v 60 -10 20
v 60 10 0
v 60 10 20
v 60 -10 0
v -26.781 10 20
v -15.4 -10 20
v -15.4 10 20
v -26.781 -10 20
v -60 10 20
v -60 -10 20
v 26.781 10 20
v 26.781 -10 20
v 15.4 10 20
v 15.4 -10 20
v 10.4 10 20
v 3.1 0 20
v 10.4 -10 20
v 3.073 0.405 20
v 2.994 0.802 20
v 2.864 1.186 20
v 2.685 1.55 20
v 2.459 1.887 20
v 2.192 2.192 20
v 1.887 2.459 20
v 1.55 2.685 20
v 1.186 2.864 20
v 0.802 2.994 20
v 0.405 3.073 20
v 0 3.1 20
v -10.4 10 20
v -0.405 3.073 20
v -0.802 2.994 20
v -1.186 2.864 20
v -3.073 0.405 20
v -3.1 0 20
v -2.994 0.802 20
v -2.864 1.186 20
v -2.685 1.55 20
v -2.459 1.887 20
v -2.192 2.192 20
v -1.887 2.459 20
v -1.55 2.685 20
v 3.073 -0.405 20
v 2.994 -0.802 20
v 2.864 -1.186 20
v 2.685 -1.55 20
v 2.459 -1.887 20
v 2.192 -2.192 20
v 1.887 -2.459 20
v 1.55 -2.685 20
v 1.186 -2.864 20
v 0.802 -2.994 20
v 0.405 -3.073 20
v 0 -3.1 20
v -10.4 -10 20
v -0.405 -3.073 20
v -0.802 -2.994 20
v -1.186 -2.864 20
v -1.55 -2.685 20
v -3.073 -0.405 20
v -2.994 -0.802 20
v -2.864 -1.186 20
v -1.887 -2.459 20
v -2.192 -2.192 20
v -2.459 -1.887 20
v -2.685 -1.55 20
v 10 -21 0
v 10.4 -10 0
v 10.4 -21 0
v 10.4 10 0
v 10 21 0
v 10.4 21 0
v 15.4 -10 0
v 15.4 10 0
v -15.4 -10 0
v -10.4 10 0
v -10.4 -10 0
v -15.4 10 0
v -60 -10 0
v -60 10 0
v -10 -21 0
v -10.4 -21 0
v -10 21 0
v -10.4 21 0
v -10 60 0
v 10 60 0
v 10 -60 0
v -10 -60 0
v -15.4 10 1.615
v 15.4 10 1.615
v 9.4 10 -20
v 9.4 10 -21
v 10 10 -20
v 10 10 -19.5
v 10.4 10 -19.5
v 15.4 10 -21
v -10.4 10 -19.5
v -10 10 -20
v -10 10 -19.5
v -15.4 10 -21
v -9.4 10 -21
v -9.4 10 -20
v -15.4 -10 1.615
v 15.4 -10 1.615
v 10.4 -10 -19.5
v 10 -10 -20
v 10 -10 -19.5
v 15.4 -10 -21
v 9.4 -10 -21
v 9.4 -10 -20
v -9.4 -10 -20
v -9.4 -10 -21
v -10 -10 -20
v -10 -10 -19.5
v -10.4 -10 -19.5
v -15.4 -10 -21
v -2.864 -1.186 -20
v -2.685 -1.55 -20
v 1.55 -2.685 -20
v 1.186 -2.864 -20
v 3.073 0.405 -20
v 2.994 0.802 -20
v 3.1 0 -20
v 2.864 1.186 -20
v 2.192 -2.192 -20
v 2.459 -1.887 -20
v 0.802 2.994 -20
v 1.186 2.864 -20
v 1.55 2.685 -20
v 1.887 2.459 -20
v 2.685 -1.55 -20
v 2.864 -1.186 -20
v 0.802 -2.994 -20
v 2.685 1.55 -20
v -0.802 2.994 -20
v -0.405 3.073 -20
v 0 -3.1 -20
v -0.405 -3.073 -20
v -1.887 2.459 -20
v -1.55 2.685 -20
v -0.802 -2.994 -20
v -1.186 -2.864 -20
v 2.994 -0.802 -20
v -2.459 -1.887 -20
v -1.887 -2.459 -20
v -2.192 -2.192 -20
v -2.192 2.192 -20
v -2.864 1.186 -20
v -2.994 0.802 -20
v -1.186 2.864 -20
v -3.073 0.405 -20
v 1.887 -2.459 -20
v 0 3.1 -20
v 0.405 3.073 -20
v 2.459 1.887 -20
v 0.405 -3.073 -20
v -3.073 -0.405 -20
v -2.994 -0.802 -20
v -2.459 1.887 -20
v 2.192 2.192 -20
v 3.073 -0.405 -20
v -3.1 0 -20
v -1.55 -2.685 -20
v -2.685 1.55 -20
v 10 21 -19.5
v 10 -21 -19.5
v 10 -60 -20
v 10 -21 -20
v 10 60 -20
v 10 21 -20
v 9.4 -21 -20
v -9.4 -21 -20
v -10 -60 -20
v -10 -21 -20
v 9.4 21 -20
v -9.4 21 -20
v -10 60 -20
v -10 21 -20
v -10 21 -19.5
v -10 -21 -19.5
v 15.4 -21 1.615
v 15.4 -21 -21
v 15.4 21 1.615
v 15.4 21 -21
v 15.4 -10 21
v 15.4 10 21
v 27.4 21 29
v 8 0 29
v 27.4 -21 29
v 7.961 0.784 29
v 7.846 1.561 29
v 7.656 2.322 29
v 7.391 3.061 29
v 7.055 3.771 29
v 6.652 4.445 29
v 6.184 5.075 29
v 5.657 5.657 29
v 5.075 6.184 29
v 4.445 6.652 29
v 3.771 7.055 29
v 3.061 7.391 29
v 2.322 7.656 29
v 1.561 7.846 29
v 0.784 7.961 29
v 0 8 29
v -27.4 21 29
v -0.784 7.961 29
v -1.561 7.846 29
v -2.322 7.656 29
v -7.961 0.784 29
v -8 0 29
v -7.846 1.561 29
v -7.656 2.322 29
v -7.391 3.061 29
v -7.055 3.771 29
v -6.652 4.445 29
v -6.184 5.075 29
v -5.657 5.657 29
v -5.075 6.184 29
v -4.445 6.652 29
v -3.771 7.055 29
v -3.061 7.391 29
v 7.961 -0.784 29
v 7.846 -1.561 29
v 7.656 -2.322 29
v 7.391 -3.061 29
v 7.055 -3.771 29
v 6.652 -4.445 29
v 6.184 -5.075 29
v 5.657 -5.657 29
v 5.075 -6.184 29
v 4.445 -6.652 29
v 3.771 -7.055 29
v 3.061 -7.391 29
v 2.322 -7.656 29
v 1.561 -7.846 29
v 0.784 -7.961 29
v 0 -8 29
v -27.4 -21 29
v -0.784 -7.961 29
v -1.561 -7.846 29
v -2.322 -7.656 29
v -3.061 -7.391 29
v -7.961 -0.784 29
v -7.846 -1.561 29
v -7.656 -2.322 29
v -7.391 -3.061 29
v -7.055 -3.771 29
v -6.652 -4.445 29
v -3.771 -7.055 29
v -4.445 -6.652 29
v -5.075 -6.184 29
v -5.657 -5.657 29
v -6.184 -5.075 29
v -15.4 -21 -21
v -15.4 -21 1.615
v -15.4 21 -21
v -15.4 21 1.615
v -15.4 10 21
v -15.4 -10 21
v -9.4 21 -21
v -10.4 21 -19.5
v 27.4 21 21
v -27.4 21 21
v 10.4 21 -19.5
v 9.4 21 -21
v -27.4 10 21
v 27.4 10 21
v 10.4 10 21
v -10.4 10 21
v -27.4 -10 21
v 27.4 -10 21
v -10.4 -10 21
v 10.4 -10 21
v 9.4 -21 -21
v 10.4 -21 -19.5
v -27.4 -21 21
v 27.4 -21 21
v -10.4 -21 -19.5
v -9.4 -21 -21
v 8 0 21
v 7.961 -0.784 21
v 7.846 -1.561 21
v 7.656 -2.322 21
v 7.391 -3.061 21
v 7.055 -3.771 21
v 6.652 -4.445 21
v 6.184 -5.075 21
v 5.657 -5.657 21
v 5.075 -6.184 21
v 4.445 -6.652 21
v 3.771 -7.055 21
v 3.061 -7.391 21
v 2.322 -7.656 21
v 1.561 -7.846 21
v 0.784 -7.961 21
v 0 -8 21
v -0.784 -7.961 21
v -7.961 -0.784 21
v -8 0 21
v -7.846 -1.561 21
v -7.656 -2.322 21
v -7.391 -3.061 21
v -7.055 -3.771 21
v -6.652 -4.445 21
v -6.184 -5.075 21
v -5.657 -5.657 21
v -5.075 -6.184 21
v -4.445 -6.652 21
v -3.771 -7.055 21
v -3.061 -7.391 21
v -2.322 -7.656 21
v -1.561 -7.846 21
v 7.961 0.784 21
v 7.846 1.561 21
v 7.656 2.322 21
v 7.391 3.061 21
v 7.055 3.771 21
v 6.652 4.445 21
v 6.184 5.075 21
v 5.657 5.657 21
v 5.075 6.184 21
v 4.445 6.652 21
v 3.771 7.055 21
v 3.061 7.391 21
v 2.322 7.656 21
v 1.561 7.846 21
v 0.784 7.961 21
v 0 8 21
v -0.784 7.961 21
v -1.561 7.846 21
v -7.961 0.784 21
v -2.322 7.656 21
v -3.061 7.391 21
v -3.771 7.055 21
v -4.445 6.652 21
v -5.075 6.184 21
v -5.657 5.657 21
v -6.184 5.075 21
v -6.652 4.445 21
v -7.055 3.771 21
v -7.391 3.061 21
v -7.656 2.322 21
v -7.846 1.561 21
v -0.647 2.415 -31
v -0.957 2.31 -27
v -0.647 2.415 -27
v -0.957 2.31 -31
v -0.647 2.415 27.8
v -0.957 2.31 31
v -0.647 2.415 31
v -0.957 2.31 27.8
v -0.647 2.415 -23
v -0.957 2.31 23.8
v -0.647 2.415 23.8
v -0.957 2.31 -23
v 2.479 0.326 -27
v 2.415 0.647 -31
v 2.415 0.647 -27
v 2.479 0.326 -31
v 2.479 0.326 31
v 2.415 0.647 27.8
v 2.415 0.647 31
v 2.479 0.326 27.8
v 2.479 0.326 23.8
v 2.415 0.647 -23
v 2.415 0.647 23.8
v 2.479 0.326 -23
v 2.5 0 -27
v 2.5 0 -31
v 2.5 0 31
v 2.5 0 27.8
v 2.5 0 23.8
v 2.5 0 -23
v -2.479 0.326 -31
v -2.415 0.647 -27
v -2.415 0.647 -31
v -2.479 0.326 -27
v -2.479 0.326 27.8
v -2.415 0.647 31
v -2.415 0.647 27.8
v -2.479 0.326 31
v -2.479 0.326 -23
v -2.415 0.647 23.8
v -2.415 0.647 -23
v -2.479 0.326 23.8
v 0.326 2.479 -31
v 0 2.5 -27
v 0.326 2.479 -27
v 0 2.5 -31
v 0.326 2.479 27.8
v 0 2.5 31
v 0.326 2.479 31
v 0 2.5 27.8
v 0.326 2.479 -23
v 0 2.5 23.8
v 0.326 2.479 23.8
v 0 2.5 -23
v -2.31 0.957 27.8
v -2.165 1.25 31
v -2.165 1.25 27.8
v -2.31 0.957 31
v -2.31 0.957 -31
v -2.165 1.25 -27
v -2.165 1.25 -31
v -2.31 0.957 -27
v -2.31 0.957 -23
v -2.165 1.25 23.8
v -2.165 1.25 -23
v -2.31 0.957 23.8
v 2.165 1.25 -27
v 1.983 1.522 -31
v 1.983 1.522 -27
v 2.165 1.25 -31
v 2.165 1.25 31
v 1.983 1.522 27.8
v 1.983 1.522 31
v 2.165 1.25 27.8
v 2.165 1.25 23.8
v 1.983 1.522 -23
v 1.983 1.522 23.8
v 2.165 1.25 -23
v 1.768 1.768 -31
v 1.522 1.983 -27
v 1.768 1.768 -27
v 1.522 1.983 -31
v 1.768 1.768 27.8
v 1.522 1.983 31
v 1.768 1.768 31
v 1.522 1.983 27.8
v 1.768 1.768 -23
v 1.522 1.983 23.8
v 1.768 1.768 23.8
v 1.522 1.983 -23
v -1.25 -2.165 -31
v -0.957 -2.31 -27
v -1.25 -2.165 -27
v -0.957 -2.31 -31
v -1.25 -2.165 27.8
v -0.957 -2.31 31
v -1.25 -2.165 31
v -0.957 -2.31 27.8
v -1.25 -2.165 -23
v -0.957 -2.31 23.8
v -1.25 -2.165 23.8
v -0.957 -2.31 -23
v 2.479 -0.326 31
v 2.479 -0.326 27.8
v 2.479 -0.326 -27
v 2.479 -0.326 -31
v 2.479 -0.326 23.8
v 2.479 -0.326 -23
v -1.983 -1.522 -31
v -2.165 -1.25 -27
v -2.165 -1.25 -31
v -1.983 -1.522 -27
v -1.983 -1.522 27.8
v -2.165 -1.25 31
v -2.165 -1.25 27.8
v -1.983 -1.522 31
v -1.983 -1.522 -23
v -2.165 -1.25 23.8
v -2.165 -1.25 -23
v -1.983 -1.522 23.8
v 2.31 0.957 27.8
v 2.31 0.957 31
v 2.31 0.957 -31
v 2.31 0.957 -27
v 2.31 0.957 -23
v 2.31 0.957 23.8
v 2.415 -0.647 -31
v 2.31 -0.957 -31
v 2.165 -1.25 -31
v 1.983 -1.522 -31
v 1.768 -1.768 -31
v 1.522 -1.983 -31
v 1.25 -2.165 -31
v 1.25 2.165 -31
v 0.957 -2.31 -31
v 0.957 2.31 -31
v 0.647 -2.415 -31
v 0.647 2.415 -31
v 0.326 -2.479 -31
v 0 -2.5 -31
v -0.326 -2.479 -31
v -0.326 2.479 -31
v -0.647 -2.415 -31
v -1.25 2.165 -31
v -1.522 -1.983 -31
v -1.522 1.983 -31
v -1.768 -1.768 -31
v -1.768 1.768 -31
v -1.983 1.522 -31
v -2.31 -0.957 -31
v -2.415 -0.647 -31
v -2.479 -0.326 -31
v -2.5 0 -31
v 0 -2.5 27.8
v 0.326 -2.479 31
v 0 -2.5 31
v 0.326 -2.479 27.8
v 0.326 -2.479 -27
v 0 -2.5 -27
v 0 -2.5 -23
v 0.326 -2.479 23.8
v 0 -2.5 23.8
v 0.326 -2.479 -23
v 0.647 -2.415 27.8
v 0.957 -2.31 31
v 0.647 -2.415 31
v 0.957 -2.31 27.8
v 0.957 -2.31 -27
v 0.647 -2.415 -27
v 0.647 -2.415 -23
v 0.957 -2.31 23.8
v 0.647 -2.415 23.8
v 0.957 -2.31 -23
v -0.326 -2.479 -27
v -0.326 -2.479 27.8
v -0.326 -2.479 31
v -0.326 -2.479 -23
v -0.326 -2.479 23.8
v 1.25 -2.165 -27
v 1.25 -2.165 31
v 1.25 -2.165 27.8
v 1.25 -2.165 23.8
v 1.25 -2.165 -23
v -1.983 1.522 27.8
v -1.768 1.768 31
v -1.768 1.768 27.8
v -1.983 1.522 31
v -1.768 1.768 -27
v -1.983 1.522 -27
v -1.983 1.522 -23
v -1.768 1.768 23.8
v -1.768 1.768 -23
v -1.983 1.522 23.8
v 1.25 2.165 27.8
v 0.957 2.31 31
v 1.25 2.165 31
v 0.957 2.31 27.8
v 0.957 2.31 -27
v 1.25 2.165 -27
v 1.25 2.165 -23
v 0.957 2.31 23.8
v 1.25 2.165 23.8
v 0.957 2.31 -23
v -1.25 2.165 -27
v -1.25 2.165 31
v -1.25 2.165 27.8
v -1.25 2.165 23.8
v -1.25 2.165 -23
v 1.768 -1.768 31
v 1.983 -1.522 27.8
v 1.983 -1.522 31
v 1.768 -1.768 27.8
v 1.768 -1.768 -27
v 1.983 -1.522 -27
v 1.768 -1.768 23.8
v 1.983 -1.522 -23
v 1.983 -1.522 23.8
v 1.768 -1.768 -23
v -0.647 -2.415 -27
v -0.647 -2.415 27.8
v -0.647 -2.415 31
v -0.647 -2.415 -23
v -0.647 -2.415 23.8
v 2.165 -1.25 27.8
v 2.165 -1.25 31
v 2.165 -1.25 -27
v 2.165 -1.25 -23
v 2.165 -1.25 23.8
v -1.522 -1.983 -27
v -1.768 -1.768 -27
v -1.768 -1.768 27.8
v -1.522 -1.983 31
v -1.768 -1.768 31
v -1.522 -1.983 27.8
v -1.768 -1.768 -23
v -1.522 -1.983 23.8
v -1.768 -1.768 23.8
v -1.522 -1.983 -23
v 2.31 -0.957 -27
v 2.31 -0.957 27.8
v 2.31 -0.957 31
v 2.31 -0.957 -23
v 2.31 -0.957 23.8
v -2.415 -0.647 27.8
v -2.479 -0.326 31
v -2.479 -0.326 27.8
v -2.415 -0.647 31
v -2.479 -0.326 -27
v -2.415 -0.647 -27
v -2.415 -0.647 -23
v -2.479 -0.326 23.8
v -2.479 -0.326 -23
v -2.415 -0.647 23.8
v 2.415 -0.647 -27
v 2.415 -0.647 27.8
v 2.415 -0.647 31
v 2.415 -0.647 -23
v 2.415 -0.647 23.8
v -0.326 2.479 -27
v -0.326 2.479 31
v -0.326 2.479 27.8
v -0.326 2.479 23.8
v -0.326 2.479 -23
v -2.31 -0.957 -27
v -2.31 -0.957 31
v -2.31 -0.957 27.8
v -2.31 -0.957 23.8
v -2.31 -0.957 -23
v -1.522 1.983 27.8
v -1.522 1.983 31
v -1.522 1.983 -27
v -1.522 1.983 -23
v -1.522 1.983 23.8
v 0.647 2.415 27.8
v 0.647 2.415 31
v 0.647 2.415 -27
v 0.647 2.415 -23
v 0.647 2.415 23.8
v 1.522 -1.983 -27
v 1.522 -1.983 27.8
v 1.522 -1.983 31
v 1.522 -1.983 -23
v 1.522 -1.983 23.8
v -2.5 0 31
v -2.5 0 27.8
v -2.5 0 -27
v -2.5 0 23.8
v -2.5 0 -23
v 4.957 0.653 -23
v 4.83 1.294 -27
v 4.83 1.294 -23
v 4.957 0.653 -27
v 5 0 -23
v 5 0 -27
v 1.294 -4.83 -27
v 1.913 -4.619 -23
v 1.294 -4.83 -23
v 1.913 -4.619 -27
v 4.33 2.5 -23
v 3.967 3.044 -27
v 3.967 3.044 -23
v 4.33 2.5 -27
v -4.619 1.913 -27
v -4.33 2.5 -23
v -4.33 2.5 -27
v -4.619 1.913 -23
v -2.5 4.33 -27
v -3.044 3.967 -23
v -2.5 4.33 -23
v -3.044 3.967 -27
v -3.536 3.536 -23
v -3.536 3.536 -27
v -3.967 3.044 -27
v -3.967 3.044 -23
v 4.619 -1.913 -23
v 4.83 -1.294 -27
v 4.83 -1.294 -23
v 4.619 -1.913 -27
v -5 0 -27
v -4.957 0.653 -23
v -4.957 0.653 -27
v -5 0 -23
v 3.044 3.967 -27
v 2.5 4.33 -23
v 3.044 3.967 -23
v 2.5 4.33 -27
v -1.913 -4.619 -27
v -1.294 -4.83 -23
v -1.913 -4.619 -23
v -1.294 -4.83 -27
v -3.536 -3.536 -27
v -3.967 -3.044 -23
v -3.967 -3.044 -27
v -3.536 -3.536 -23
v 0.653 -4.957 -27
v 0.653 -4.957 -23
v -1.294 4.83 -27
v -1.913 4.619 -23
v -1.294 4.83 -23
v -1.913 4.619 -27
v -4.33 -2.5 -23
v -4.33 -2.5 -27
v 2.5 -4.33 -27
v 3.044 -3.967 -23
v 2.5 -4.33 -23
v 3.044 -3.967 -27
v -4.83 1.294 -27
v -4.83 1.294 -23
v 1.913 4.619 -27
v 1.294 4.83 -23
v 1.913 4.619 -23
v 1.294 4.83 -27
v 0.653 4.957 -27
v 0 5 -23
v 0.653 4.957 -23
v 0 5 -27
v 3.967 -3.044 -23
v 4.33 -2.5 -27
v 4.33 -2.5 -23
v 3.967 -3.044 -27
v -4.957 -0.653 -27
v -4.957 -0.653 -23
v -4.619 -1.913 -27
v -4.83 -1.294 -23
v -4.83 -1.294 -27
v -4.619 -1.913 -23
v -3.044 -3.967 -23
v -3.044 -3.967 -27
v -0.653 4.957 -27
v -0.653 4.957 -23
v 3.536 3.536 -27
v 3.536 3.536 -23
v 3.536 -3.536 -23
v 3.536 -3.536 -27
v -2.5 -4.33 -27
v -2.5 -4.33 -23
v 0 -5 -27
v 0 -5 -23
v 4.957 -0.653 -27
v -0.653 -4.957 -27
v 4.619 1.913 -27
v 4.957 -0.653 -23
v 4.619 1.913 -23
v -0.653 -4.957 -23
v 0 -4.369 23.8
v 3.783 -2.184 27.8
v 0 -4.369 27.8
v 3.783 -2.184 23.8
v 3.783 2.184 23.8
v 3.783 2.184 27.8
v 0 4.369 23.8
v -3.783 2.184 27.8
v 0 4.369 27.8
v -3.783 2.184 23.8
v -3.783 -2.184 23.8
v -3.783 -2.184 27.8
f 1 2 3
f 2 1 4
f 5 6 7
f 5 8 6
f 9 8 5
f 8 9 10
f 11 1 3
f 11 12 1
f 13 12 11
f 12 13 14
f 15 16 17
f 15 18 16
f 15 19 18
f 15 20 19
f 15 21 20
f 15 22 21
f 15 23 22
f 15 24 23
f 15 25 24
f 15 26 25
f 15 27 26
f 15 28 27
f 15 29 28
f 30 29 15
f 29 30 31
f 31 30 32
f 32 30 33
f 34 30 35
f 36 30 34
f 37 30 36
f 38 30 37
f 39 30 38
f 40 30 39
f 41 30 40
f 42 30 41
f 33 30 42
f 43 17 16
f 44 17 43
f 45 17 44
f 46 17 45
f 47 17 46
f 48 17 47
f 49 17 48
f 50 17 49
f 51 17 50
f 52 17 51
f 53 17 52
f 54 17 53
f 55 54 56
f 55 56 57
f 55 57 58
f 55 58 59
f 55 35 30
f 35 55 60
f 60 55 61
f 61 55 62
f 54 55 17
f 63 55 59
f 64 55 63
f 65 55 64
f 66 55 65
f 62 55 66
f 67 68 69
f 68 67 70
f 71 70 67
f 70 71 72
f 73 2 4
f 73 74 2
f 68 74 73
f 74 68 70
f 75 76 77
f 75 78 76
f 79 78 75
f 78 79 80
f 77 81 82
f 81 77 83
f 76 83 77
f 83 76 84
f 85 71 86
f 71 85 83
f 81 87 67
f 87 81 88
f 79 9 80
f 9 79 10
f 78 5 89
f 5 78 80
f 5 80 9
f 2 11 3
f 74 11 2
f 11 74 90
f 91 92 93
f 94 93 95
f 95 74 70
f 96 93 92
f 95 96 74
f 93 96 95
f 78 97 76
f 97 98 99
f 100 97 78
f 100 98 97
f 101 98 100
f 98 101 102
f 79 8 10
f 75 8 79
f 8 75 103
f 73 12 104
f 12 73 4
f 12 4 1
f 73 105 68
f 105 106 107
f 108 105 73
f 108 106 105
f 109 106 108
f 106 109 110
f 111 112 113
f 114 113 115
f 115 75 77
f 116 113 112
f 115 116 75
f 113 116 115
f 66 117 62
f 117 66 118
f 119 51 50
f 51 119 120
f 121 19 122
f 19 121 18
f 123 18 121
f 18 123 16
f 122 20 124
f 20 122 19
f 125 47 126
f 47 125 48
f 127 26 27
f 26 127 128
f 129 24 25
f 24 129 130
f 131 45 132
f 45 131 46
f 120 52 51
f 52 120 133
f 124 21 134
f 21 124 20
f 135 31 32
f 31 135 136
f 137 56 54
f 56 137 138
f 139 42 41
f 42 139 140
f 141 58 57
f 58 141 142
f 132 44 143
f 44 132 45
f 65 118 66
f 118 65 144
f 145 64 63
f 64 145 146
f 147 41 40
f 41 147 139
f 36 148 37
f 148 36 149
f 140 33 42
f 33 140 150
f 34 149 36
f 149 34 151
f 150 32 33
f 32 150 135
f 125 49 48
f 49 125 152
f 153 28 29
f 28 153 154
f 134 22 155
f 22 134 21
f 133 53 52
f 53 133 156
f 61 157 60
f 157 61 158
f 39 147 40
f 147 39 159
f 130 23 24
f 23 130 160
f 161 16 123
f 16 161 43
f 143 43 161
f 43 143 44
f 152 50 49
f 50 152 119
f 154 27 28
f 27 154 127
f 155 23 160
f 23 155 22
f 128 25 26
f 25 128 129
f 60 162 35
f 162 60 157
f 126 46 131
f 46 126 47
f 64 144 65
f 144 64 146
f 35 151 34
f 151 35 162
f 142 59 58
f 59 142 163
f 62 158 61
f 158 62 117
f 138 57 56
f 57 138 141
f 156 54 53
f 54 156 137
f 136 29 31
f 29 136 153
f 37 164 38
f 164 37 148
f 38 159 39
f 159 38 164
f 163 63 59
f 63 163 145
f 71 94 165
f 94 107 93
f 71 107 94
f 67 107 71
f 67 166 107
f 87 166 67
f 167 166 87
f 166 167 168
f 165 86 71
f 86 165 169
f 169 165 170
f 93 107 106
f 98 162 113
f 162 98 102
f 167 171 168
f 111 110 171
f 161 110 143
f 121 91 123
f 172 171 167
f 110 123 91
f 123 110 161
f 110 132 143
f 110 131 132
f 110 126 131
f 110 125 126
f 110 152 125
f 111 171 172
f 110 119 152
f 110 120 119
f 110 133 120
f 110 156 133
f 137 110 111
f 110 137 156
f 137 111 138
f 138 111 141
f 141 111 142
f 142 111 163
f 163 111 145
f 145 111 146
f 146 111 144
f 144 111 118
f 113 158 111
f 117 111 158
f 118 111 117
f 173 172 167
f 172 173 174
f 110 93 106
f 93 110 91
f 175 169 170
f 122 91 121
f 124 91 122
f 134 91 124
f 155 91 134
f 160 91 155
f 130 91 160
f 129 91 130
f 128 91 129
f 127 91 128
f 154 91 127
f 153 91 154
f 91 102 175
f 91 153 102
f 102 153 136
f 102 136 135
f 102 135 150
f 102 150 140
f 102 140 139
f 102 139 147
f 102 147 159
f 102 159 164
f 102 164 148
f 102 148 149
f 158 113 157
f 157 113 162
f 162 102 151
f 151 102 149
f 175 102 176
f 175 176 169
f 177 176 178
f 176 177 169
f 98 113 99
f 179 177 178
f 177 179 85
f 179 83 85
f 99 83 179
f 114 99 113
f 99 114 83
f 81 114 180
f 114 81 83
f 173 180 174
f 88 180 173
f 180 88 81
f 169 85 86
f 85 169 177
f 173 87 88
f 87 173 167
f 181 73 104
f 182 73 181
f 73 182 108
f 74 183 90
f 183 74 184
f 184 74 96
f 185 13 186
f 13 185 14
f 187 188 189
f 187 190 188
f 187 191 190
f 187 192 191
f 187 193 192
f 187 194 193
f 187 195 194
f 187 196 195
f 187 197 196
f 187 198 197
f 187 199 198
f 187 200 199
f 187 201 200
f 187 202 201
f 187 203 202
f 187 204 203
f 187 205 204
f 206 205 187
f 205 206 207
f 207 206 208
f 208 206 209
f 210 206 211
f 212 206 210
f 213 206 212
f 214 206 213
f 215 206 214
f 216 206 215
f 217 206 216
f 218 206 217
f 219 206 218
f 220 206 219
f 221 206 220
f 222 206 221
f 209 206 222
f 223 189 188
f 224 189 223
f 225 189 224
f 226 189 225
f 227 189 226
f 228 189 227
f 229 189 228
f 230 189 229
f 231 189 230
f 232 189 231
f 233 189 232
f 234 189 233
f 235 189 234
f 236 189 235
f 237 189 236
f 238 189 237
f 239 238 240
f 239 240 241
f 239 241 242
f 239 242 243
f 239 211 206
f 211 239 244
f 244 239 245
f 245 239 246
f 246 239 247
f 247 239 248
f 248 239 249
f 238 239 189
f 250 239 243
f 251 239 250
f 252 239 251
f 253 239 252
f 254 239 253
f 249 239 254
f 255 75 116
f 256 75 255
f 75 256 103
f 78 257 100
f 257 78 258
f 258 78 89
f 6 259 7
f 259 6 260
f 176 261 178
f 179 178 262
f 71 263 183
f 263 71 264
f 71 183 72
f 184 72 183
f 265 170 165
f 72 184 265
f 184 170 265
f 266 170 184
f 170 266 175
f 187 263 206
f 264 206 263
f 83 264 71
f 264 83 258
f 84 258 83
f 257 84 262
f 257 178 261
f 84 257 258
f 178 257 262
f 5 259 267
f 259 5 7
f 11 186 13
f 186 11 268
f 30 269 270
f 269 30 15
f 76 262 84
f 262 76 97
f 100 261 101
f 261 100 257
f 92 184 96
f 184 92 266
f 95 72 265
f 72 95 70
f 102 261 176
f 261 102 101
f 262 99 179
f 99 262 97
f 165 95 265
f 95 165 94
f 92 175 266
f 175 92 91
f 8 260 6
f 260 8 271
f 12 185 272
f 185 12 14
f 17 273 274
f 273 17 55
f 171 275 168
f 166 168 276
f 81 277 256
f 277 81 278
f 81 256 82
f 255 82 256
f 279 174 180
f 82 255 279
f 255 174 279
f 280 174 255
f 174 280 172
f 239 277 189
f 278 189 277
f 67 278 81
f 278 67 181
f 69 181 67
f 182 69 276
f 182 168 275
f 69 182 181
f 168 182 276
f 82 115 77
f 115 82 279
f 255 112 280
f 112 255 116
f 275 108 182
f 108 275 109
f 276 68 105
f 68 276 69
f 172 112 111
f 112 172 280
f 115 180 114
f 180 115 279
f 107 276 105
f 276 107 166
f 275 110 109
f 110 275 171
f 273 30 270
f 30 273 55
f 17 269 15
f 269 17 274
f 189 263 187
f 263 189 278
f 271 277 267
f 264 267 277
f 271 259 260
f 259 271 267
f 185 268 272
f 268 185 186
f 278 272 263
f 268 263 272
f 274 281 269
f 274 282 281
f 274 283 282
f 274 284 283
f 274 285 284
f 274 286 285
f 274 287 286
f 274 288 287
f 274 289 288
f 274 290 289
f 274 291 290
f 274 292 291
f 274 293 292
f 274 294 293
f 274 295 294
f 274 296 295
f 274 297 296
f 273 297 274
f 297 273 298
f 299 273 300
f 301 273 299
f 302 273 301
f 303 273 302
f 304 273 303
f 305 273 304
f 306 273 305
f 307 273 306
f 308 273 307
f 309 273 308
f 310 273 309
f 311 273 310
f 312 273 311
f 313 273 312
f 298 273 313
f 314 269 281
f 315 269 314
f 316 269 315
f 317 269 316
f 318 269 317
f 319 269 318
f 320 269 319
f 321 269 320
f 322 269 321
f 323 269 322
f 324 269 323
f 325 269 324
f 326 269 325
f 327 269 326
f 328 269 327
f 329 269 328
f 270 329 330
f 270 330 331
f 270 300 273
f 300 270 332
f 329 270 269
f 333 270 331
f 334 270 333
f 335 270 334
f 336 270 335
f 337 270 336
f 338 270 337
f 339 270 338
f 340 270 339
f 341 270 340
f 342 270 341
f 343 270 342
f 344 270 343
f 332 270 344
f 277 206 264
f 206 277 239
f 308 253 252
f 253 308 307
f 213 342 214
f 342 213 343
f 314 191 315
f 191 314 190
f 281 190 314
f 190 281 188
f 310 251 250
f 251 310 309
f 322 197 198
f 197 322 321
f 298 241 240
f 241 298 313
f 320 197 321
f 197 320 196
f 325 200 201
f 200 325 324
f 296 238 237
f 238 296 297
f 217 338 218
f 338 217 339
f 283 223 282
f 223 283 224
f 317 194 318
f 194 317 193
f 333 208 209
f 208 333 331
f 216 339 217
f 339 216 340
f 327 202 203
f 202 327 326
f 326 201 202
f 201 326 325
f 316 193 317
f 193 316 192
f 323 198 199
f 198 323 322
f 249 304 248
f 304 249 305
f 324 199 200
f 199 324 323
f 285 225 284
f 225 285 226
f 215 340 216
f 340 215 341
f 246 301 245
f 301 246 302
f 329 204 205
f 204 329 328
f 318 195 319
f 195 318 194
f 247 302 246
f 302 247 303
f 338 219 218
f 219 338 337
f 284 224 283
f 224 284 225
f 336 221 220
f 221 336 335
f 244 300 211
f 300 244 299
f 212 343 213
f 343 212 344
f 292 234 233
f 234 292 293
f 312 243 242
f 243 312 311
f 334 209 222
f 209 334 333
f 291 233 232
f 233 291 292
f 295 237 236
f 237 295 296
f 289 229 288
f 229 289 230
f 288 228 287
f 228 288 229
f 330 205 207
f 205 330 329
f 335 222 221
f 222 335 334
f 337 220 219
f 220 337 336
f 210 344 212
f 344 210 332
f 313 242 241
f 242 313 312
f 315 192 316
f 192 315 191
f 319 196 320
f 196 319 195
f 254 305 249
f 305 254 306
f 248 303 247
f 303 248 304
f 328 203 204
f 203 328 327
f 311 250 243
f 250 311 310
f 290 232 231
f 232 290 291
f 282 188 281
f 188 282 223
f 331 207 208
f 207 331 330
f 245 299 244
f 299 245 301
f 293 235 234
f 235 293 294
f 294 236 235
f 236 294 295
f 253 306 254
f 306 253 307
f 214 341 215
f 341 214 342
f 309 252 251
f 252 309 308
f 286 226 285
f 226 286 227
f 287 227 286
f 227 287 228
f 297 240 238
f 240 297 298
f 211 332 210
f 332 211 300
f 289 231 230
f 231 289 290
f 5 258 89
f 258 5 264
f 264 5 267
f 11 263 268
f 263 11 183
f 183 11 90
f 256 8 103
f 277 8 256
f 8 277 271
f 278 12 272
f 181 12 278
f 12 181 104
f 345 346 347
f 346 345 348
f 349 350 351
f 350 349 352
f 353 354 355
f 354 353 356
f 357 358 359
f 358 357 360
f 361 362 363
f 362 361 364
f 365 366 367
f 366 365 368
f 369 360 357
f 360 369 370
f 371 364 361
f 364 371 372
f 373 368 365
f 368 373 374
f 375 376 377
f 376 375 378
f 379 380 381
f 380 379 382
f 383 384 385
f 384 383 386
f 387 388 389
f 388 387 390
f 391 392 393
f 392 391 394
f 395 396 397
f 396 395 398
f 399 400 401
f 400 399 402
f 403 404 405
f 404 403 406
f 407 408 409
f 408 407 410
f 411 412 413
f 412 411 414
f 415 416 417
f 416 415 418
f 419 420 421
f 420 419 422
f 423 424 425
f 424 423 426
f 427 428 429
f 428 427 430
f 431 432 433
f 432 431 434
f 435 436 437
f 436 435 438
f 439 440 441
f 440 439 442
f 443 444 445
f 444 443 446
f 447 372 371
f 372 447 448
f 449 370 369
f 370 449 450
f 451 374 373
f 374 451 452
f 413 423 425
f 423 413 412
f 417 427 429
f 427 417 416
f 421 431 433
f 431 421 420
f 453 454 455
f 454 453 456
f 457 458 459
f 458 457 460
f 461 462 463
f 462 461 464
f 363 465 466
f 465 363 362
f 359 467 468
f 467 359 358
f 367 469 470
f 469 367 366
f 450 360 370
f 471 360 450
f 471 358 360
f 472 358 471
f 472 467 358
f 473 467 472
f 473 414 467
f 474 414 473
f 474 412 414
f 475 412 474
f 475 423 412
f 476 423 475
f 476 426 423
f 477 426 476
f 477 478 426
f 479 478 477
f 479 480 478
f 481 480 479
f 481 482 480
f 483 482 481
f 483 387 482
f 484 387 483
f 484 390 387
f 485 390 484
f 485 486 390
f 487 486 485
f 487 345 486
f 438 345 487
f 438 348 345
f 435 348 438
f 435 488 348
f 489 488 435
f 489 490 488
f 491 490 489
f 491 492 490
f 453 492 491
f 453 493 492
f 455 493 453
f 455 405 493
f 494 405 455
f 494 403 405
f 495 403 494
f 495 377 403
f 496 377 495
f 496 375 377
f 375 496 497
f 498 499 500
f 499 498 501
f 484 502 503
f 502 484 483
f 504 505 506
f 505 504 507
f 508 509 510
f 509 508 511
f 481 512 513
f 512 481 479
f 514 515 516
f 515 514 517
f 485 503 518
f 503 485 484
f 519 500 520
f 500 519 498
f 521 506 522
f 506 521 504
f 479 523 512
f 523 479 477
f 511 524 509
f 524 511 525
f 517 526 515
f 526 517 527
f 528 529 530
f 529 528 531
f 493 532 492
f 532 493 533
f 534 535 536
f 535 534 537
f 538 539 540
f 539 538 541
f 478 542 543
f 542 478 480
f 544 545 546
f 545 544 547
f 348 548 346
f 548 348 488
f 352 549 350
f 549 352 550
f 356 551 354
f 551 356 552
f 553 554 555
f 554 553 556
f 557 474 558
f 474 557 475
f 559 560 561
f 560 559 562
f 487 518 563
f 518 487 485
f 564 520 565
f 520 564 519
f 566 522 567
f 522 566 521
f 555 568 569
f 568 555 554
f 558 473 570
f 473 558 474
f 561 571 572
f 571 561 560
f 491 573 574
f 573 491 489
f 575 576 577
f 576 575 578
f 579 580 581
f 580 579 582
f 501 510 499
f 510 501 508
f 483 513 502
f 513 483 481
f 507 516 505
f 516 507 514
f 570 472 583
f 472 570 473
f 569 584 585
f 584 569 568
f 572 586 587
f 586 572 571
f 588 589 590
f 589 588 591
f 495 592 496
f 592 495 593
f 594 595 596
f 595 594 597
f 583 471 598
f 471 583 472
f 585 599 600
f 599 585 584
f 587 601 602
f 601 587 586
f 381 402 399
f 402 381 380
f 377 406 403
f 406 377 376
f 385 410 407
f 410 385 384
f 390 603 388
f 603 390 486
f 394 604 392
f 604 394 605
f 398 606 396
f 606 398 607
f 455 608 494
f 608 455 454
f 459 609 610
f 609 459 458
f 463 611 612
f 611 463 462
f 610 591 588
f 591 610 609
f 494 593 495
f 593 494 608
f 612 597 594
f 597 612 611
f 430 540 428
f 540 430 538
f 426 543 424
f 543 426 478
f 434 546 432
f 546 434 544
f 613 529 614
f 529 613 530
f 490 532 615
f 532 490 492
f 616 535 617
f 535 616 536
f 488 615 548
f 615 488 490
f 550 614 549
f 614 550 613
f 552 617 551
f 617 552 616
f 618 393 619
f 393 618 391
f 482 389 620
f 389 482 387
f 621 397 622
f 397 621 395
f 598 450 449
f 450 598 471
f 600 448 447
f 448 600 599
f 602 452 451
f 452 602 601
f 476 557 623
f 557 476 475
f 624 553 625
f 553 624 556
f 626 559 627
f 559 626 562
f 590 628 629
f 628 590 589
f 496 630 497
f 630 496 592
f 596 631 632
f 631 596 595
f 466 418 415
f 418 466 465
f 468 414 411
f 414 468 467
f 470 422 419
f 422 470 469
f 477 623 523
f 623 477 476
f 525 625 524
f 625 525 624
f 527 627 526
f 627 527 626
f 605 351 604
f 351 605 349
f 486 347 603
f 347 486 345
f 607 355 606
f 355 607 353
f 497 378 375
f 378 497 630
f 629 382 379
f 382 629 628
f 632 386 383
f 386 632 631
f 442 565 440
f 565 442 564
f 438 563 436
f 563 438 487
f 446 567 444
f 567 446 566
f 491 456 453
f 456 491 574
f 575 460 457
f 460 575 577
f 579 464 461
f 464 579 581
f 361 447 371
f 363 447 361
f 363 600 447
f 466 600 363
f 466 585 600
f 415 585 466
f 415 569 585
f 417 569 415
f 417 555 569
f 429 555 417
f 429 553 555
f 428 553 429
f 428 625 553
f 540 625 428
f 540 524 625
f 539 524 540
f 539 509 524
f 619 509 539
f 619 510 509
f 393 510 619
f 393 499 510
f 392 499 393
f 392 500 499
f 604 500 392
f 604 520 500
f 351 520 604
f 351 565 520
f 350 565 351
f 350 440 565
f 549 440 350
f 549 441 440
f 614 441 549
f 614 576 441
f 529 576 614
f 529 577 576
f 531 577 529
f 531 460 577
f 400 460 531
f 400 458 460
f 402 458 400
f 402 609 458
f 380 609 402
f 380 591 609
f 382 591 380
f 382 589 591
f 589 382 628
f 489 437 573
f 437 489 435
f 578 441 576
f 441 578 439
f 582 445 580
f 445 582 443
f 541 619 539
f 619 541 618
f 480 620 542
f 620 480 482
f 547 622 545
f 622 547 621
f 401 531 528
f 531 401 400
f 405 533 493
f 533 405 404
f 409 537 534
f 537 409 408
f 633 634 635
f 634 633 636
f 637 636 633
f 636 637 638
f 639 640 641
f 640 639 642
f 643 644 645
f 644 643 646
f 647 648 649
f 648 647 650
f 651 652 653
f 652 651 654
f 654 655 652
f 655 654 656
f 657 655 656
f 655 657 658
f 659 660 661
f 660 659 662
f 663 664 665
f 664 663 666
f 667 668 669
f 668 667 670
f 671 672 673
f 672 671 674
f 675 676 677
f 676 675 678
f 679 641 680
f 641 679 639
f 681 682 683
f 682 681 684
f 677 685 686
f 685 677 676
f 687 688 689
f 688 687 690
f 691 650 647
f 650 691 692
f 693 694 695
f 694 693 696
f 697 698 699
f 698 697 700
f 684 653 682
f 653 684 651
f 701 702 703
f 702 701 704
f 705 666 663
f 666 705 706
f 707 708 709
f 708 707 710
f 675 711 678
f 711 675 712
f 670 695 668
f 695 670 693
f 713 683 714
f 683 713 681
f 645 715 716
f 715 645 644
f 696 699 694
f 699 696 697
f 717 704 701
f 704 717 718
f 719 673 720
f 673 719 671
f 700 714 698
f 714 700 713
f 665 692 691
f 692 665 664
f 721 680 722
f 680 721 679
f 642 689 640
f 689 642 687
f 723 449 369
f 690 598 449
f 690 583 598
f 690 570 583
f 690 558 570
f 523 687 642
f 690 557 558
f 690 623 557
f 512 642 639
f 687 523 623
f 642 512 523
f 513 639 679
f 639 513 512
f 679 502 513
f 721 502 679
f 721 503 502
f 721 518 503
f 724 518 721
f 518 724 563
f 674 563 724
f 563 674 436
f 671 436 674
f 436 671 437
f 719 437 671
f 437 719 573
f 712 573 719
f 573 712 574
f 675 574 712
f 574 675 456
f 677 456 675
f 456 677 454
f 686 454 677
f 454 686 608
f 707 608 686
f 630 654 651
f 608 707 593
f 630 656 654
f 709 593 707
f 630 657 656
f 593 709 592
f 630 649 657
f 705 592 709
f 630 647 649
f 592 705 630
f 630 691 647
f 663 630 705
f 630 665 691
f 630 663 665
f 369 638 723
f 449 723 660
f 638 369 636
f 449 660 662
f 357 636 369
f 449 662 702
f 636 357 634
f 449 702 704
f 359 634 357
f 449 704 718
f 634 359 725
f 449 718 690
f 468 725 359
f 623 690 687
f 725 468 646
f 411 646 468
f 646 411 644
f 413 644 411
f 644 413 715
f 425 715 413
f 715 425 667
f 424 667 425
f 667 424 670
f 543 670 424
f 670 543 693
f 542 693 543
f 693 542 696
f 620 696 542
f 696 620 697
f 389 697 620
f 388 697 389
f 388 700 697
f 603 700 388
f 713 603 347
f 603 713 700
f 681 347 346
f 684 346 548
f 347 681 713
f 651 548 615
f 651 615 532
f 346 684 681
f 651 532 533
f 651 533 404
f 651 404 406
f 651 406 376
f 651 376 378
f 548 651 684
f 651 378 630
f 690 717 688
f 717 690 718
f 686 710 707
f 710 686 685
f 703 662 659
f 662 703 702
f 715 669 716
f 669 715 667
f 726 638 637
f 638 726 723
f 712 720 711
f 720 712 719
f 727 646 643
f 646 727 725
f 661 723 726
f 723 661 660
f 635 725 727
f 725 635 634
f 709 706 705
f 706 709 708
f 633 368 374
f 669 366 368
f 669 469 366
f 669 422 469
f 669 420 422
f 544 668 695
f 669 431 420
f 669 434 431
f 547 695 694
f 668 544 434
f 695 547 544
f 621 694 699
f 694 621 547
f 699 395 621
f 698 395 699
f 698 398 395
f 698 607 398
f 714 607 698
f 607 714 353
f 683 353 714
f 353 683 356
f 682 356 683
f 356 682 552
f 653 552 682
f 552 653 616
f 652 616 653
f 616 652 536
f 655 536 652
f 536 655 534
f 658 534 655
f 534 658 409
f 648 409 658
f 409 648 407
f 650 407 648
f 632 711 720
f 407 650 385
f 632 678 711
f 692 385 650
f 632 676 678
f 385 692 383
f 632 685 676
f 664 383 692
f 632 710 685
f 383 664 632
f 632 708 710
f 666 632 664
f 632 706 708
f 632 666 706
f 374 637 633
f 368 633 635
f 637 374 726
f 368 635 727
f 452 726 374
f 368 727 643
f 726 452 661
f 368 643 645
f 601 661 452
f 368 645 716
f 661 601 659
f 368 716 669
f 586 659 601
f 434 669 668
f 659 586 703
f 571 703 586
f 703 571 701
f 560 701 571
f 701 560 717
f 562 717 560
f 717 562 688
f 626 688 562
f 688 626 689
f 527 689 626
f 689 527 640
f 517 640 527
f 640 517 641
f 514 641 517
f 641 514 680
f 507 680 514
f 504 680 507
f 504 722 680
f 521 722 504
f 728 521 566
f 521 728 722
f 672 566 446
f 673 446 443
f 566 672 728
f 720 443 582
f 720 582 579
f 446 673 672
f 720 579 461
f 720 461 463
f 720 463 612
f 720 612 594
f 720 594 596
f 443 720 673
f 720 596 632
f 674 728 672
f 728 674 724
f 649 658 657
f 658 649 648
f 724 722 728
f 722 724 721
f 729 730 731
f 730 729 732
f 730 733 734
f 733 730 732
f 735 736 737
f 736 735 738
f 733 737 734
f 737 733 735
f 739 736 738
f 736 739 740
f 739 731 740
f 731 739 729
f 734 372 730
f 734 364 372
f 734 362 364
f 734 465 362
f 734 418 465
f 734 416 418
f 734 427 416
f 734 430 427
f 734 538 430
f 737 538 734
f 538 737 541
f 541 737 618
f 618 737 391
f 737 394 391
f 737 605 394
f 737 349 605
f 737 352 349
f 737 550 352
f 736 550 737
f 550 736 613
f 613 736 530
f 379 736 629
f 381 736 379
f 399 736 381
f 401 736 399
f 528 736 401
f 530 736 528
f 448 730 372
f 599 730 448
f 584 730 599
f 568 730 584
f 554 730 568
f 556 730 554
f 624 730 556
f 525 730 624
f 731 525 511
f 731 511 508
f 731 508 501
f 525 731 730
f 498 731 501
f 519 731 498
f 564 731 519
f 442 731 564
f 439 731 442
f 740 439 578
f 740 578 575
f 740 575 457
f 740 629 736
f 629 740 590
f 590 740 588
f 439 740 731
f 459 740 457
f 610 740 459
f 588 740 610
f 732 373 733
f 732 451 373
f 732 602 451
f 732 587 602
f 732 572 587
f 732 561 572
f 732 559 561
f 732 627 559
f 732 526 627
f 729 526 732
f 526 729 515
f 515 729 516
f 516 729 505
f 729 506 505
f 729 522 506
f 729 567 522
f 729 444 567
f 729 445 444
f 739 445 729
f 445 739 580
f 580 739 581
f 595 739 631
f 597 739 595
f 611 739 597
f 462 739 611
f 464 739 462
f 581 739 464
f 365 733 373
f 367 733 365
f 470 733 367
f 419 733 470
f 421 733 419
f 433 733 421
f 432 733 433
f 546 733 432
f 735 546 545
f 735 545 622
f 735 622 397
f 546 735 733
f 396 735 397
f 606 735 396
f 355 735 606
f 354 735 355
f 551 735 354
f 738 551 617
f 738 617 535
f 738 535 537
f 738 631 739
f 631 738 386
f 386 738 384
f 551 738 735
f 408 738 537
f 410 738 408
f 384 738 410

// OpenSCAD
// file: ../perpendicular-u-joint-guard-v1.3-triangular-corner-fills/candidate_triangular_corner_fills.scad
// Candidate v1.3: four triangular concave-corner fill blocks.
//
// Base: accepted v0.7 eaves12 geometry. v0.9/v1.0/v1.1/v1.2 are not
// imported. Each corner block is a real triangular prism: broad at the roof,
// tapering continuously toward z=0, and overlapping the U side wall.

use <../perpendicular-u-joint-guard-v0.7/perpendicular_double_u_guard.scad>;

$fn = 48;
PART = "candidate_iso";

// Explicit v0.7 interface values.
roof_x_outer = 27.4;       // accepted eaves12 roof: -27.4..+27.4
side_wall_x_outer = 15.4;  // existing side-wall outer edge
blue_tube_x_outer = 10.0;  // blue lower 20x20 tube half-width
plate_y_inner = 10.0;
plate_y_outer = 21.0;
plate_depth_y = plate_y_outer - plate_y_inner; // 11 mm per front/back U plate

// The top edge is 0.5 mm inside the roof volume (roof underside z=21), and
// the lower point enters the side wall by 1 mm in X.  The XZ area therefore
// has positive overlap at both ends, not edge-only contact.
triangle_top_z = 21.5;
triangle_bottom_z = 0.0;
triangle_roof_overlap_z = triangle_top_z - 21.0;
triangle_side_overlap_x = 1.0;
triangle_inner_x = side_wall_x_outer - triangle_side_overlap_x; // 14.4

// Bottom retaining-hook contract copied from v0.7 for explicit verification.
hook_height_z = 1.5;
u_bottom_z = -21.0;
hook_top_z = u_bottom_z + hook_height_z; // -19.5

assert(plate_depth_y == 11, "每个三角块的前后板深必须是 11 mm");
assert(triangle_top_z > 21 && triangle_bottom_z == 0,
       "三角块上端必须搭入屋檐、下端落到 z=0");
assert(triangle_inner_x > blue_tube_x_outer,
       "三角块下端不得进入蓝色方管 x=-10..+10 包络");
assert(triangle_side_overlap_x > 0 && triangle_roof_overlap_z > 0,
       "三角块必须与屋檐和侧墙都有正重叠");
assert(hook_height_z == 1.5 && u_bottom_z == -21 && hook_top_z == -19.5,
       "底部卡脚必须保持 z=-21..-19.5");

// A polygon in XZ is extruded only through the corresponding front/back U
// plate. The center y=-10..+10 passage remains open.
module triangular_fill_xz(points, yc) {
    translate([0, yc, 0])
        rotate([90, 0, 0])
            linear_extrude(height = plate_depth_y,
                           center = true,
                           convexity = 10)
                polygon(points = points);
}

module front_neg_x_triangle() {
    // -X roof end -> +X inward. Top wide, lower point at the side wall.
    triangular_fill_xz([
        [-roof_x_outer, 21.0],
        [-triangle_inner_x, triangle_top_z],
        [-triangle_inner_x, triangle_bottom_z]
    ], (plate_y_inner + plate_y_outer) / 2);
}

module front_pos_x_triangle() {
    // +X roof end -> -X inward. Mirrored triangle.
    triangular_fill_xz([
        [roof_x_outer, 21.0],
        [triangle_inner_x, triangle_top_z],
        [triangle_inner_x, triangle_bottom_z]
    ], (plate_y_inner + plate_y_outer) / 2);
}

module back_neg_x_triangle() {
    triangular_fill_xz([
        [-roof_x_outer, 21.0],
        [-triangle_inner_x, triangle_top_z],
        [-triangle_inner_x, triangle_bottom_z]
    ], -(plate_y_inner + plate_y_outer) / 2);
}

module back_pos_x_triangle() {
    triangular_fill_xz([
        [roof_x_outer, 21.0],
        [triangle_inner_x, triangle_top_z],
        [triangle_inner_x, triangle_bottom_z]
    ], -(plate_y_inner + plate_y_outer) / 2);
}

module front_two_triangular_fills() {
    union() {
        front_neg_x_triangle();
        front_pos_x_triangle();
    }
}

module back_two_triangular_fills() {
    union() {
        back_neg_x_triangle();
        back_pos_x_triangle();
    }
}

module all_four_triangular_fills() {
    union() {
        front_two_triangular_fills();
        back_two_triangular_fills();
    }
}

module candidate_print_solid() {
    // Final hole operation is deliberately after the complete four-block
    // union; this preserves a true Z through-hole and the round nut pocket.
    difference() {
        union() {
            double_u_clip();
            all_four_triangular_fills();
        }
        vertical_screw_relief();
    }
}

module candidate_clip() {
    candidate_print_solid();
}

module candidate_assembly_iso() {
    upper_long_tube();
    lower_cross_tube();
    color([0.96, 0.39, 0.08]) double_u_clip();
    color([0.86, 0.13, 0.08]) front_two_triangular_fills();
    color([0.62, 0.12, 0.52]) back_two_triangular_fills();
    vertical_joint_screw();
}

module candidate_front_xz() {
    lower_cross_tube();
    color([0.96, 0.39, 0.08]) double_u_clip();
    color([0.86, 0.13, 0.08]) front_two_triangular_fills();
    vertical_joint_screw();
}

module candidate_back_xz() {
    lower_cross_tube();
    color([0.96, 0.39, 0.08]) double_u_clip();
    color([0.62, 0.12, 0.52]) back_two_triangular_fills();
    vertical_joint_screw();
}

module candidate_top_slice() {
    // At z=-0.5..2.5 the four blocks show their two front/back 11 mm bands;
    // the blue tube and the central y gap remain visible.
    slice_box = 200;
    color([0.28, 0.45, 0.78])
        intersection() {
            lower_cross_tube();
            translate([-slice_box / 2, -slice_box / 2, -0.5])
                cube([slice_box, slice_box, 3.0]);
        }
    color([0.96, 0.39, 0.08])
        intersection() {
            double_u_clip();
            translate([-slice_box / 2, -slice_box / 2, -0.5])
                cube([slice_box, slice_box, 3.0]);
        }
    color([0.86, 0.13, 0.08])
        intersection() {
            front_two_triangular_fills();
            translate([-slice_box / 2, -slice_box / 2, -0.5])
                cube([slice_box, slice_box, 3.0]);
        }
    color([0.62, 0.12, 0.52])
        intersection() {
            back_two_triangular_fills();
            translate([-slice_box / 2, -slice_box / 2, -0.5])
                cube([slice_box, slice_box, 3.0]);
        }
}

module candidate_hole_section() {
    // Center y=0 section: the bore and round nut pocket are shown without
    // confusing them with the bottom hook, which is outside this section.
    intersection() {
        candidate_print_solid();
        translate([-100, -0.4, -100]) cube([200, 0.8, 200]);
    }
}

module candidate_hook_check() {
    // Isolated lower detail: exact imported v0.7 U plate and blue tube, with
    // hook volumes highlighted only for review. This is not the print union.
    detail_box = 200;
    detail_z0 = -22;
    detail_h = 5;
    detail_y0 = 8;
    detail_ydepth = 15;
    intersection() {
        lower_cross_tube();
        translate([-detail_box / 2, detail_y0, detail_z0])
            cube([detail_box, detail_ydepth, detail_h]);
    }
    color([0.96, 0.39, 0.08])
        intersection() {
            u_plate(plate_y_inner, plate_y_outer);
            translate([-detail_box / 2, detail_y0, detail_z0])
                cube([detail_box, detail_ydepth, detail_h]);
        }
    color([0.20, 0.78, 0.20])
        intersection() {
            union() {
                translate([-13.65, 15.5, -20.25])
                    cube([3.5, 11, 1.5], center = true);
                translate([13.65, 15.5, -20.25])
                    cube([3.5, 11, 1.5], center = true);
            }
            translate([-detail_box / 2, detail_y0, detail_z0])
                cube([detail_box, detail_ydepth, detail_h]);
        }
}

if (PART == "candidate_clip") {
    candidate_clip();
} else if (PART == "candidate_front_xz") {
    candidate_front_xz();
} else if (PART == "candidate_back_xz") {
    candidate_back_xz();
} else if (PART == "candidate_top_slice") {
    candidate_top_slice();
} else if (PART == "candidate_hole_section") {
    candidate_hole_section();
} else if (PART == "candidate_hook_check") {
    candidate_hook_check();
} else {
    candidate_assembly_iso();
}
// file: ../perpendicular-u-joint-guard-v1.4-full-nut-passage/full_nut_passage_guard.scad
// v1.4: keep the exact v1.3 body; remove the nut-pocket floor with one
// full-depth Ø16 cylindrical subtraction. Units: mm; Z positive upwards.
// Imported v1.3 geometry contains all four triangles and the lower hooks.
use <../perpendicular-u-joint-guard-v1.3-triangular-corner-fills/candidate_triangular_corner_fills.scad>;

$fn = 48;
PART = "clip";
nut_passage_d = 16.0;

module full_depth_nut_passage() {
    // Cutter extends z=-31..39, past the whole printed z=-21..29 envelope.
    // 64 facets match the existing Ø16 pocket, avoiding a stepped profile.
    translate([0, 0, 4])
        cylinder(d = nut_passage_d, h = 70, center = true, $fn = 64);
}

module guard_v1_4() {
    difference() {
        candidate_print_solid();
        full_depth_nut_passage();
    }
}

guard_v1_4();
// file: vertical_tube_clearance_guard.scad
// v1.5: v1.4 Ø16 full nut passage + minimum downward-entry upper-tube slot.
// Units mm. X: upper long tube; Y: blue foot/front-back; Z: up.
use <../perpendicular-u-joint-guard-v1.4-full-nut-passage/full_nut_passage_guard.scad>;

$fn = 48;

module upper_pipe_vertical_entry_slot() {
    // Fixed gray upper tube: x=-60..60, y=-10..10, z=0..20.
    // While the clip moves down, that tube sweeps upward in clip coordinates.
    // A bottom-open slot ending at z=20 covers its whole relevant sweep in
    // the printed z=-21..29 envelope. Roof underside remains at z=21.
    // Preserve exact 20 mm Y width rather than silently adding fit clearance.
    translate([-60, -10, -31]) cube([120, 20, 51]);
}

module guard_v1_5() {
    difference() {
        guard_v1_4();
        upper_pipe_vertical_entry_slot();
    }
}

guard_v1_5();
// main file
// v1.5 real SCAD assembly and motion checks; all old sources unchanged.
use <vertical_tube_clearance_guard.scad>;
use <../perpendicular-u-joint-guard-v1.4-full-nut-passage/full_nut_passage_guard.scad>;
use <../perpendicular-u-joint-guard-v1.3-triangular-corner-fills/candidate_triangular_corner_fills.scad>;
use <../perpendicular-u-joint-guard-v0.7/perpendicular_double_u_guard.scad>;

$fn = 48;
VIEW = "assembly";
OFFSET_Z = 0;

module slice() {
    intersection() {
        children();
        translate([-36, -0.025, -34]) cube([72, 0.05, 68]);
    }
}
module label_xz(value, x, z, size = 3.2, c = [0.10, 0.12, 0.15]) {
    color(c) translate([x, -1, z]) rotate([90, 0, 0])
        linear_extrude(height = 0.12)
            text(value, font = "Arial Unicode MS", size = size,
                 halign = "left", valign = "center");
}
module label_yz(value, y, z, size = 3.2, c = [0.10, 0.12, 0.15]) {
    color(c) translate([14, y, z]) rotate([90, 0, 90])
        linear_extrude(height = 0.12)
            text(value, font = "Arial Unicode MS", size = size,
                 halign = "left", valign = "center");
}
module assembled() {
    upper_long_tube();
    lower_cross_tube();
    color([0.96, 0.39, 0.08]) translate([0, 0, OFFSET_Z]) guard_v1_5();
    vertical_joint_screw();
}
module centre_section() {
    color([0.96, 0.39, 0.08]) slice() guard_v1_5();
    color([0.58, 0.61, 0.66]) slice() upper_long_tube();
    color([0.28, 0.45, 0.78]) slice() lower_cross_tube();
    color([0.82, 0.82, 0.84]) slice() difference() {
        vertical_joint_screw();
        translate([-12, -12, -27]) cube([24, 24, 4]);
        translate([-12, -12, 23.8]) cube([24, 24, 4]);
    }
    color([0.92, 0.70, 0.12]) slice() intersection() {
        vertical_joint_screw();
        union() {
            translate([-12, -12, -27]) cube([24, 24, 4]);
            translate([-12, -12, 23.8]) cube([24, 24, 4]);
        }
    }
    label_xz("v1.5 中心剖面  Y=0", -39, 43, 4.1);
    label_xz("屋檐下方留出灰管竖直装入通道", -39, 36, 3.2);
    label_xz("Ø16 全深通行孔，无台阶", 39, 29, 3.2);
    label_xz("上方灰管", 39, 12, 3.4);
    label_xz("下方蓝管", 39, -12, 3.4, [0.18, 0.3, 0.6]);
    label_xz("原侧墙 X=±10.4..15.4 在中央 Y=-10..+10 段已让位", -39, -38, 2.9);
}
module entry_motion_view() {
    assembled();
    color([0.1, 0.62, 0.23]) {
        translate([40, -30, 38]) cylinder(d = 1.7, h = 31);
        translate([40, -30, 38]) rotate([180, 0, 0])
            cylinder(r1 = 4.5, r2 = 0, h = 9);
    }
    color([0.1, 0.12, 0.15]) translate([-40, -5, 112])
        linear_extrude(height = 0.3)
            text("v1.5  沿 -Z 套入", font = "Arial Unicode MS", size = 5);
}
module y_entry_section() {
    // A real YZ section through x=13 crosses the former interfering side wall.
    color([0.96, 0.39, 0.08]) intersection() {
        guard_v1_5();
        translate([12.975, -32, -25]) cube([0.05, 64, 60]);
    }
    color([0.58, 0.61, 0.66]) intersection() {
        upper_long_tube();
        translate([12.975, -32, -25]) cube([0.05, 64, 60]);
    }
    label_yz("v1.5 侧剖面 X=13", -27, 40, 3.8);
    label_yz("中央 20 mm 向下开口，灰管可直入", -27, 34, 2.7);
    label_yz("Y=-10..+10", -8, -29, 2.8);
    label_yz("前后 U 板及三角块保留", -27, -36, 2.7);
}

module allowed_bottom_hook_regions() {
    // Exact v0.7 hook boxes, used ONLY to classify the allowed snap-fit
    // interference. They are never added to or removed from the exported part.
    // Original centers: ±11.15 (not ±13.65), Z=-20.25, height=1.5.
    for (yc = [-15.5, 15.5])
        for (xc = [-11.15, 11.15])
            translate([xc, yc, -20.25]) cube([3.5, 11, 1.5], center = true);
}

module retained_hook_detail() {
    // Real lower crop of the completed model; exact hook volumes highlighted.
    color([0.28, 0.45, 0.78]) intersection() {
        lower_cross_tube();
        translate([-20, 8, -22]) cube([40, 16, 6]);
    }
    color([0.96, 0.39, 0.08]) intersection() {
        difference() { guard_v1_5(); allowed_bottom_hook_regions(); }
        translate([-20, 8, -22]) cube([40, 16, 6]);
    }
    color([0.18, 0.72, 0.18]) intersection() {
        guard_v1_5(); allowed_bottom_hook_regions();
        translate([-20, 8, -22]) cube([40, 16, 6]);
    }
}

if (VIEW == "section") centre_section();
else if (VIEW == "entry_section") y_entry_section();
else if (VIEW == "insertion") entry_motion_view();
else if (VIEW == "hook_detail") retained_hook_detail();
else if (VIEW == "clip") guard_v1_5();
else if (VIEW == "upper_tube_motion_obstruction") {
    intersection() {
        guard_v1_5();
        hull() { upper_long_tube(); translate([0, 0, -52]) upper_long_tube(); }
    }
} else if (VIEW == "nut_motion_obstruction") {
    intersection() {
        guard_v1_5();
        hull() { vertical_joint_screw(); translate([0, 0, -52]) vertical_joint_screw(); }
    }
} else if (VIEW == "passage_obstruction") {
    intersection() {
        guard_v1_5();
        translate([0, 0, 4]) cylinder(d = 15.999, h = 70, center = true, $fn = 64);
    }
} else if (VIEW == "lower_tube_motion_obstruction") {
    intersection() {
        guard_v1_5();
        hull() { lower_cross_tube(); translate([0, 0, -52]) lower_cross_tube(); }
    }
} else if (VIEW == "lower_tube_seated_obstruction") {
    intersection() { guard_v1_5(); lower_cross_tube(); }
} else if (VIEW == "rigid_lower_tube_motion_obstruction") {
    intersection() {
        difference() { guard_v1_5(); allowed_bottom_hook_regions(); }
        hull() { lower_cross_tube(); translate([0, 0, -52]) lower_cross_tube(); }
    }
} else if (VIEW == "hooks_changed") {
    union() {
        difference() {
            intersection() { guard_v1_4(); allowed_bottom_hook_regions(); }
            guard_v1_5();
        }
        difference() {
            intersection() { guard_v1_5(); allowed_bottom_hook_regions(); }
            guard_v1_4();
        }
    }
} else if (VIEW == "triangles_changed") {
    // The underlying v1.3 triangle definitions are unchanged. Their material
    // must still be present in the completed v1.5 solid.
    difference() { all_four_triangular_fills(); guard_v1_5(); }
} else if (VIEW == "changed_outside_entry_slot") {
    difference() {
        difference() { guard_v1_4(); guard_v1_5(); }
        upper_pipe_vertical_entry_slot();
    }
} else assembled();
